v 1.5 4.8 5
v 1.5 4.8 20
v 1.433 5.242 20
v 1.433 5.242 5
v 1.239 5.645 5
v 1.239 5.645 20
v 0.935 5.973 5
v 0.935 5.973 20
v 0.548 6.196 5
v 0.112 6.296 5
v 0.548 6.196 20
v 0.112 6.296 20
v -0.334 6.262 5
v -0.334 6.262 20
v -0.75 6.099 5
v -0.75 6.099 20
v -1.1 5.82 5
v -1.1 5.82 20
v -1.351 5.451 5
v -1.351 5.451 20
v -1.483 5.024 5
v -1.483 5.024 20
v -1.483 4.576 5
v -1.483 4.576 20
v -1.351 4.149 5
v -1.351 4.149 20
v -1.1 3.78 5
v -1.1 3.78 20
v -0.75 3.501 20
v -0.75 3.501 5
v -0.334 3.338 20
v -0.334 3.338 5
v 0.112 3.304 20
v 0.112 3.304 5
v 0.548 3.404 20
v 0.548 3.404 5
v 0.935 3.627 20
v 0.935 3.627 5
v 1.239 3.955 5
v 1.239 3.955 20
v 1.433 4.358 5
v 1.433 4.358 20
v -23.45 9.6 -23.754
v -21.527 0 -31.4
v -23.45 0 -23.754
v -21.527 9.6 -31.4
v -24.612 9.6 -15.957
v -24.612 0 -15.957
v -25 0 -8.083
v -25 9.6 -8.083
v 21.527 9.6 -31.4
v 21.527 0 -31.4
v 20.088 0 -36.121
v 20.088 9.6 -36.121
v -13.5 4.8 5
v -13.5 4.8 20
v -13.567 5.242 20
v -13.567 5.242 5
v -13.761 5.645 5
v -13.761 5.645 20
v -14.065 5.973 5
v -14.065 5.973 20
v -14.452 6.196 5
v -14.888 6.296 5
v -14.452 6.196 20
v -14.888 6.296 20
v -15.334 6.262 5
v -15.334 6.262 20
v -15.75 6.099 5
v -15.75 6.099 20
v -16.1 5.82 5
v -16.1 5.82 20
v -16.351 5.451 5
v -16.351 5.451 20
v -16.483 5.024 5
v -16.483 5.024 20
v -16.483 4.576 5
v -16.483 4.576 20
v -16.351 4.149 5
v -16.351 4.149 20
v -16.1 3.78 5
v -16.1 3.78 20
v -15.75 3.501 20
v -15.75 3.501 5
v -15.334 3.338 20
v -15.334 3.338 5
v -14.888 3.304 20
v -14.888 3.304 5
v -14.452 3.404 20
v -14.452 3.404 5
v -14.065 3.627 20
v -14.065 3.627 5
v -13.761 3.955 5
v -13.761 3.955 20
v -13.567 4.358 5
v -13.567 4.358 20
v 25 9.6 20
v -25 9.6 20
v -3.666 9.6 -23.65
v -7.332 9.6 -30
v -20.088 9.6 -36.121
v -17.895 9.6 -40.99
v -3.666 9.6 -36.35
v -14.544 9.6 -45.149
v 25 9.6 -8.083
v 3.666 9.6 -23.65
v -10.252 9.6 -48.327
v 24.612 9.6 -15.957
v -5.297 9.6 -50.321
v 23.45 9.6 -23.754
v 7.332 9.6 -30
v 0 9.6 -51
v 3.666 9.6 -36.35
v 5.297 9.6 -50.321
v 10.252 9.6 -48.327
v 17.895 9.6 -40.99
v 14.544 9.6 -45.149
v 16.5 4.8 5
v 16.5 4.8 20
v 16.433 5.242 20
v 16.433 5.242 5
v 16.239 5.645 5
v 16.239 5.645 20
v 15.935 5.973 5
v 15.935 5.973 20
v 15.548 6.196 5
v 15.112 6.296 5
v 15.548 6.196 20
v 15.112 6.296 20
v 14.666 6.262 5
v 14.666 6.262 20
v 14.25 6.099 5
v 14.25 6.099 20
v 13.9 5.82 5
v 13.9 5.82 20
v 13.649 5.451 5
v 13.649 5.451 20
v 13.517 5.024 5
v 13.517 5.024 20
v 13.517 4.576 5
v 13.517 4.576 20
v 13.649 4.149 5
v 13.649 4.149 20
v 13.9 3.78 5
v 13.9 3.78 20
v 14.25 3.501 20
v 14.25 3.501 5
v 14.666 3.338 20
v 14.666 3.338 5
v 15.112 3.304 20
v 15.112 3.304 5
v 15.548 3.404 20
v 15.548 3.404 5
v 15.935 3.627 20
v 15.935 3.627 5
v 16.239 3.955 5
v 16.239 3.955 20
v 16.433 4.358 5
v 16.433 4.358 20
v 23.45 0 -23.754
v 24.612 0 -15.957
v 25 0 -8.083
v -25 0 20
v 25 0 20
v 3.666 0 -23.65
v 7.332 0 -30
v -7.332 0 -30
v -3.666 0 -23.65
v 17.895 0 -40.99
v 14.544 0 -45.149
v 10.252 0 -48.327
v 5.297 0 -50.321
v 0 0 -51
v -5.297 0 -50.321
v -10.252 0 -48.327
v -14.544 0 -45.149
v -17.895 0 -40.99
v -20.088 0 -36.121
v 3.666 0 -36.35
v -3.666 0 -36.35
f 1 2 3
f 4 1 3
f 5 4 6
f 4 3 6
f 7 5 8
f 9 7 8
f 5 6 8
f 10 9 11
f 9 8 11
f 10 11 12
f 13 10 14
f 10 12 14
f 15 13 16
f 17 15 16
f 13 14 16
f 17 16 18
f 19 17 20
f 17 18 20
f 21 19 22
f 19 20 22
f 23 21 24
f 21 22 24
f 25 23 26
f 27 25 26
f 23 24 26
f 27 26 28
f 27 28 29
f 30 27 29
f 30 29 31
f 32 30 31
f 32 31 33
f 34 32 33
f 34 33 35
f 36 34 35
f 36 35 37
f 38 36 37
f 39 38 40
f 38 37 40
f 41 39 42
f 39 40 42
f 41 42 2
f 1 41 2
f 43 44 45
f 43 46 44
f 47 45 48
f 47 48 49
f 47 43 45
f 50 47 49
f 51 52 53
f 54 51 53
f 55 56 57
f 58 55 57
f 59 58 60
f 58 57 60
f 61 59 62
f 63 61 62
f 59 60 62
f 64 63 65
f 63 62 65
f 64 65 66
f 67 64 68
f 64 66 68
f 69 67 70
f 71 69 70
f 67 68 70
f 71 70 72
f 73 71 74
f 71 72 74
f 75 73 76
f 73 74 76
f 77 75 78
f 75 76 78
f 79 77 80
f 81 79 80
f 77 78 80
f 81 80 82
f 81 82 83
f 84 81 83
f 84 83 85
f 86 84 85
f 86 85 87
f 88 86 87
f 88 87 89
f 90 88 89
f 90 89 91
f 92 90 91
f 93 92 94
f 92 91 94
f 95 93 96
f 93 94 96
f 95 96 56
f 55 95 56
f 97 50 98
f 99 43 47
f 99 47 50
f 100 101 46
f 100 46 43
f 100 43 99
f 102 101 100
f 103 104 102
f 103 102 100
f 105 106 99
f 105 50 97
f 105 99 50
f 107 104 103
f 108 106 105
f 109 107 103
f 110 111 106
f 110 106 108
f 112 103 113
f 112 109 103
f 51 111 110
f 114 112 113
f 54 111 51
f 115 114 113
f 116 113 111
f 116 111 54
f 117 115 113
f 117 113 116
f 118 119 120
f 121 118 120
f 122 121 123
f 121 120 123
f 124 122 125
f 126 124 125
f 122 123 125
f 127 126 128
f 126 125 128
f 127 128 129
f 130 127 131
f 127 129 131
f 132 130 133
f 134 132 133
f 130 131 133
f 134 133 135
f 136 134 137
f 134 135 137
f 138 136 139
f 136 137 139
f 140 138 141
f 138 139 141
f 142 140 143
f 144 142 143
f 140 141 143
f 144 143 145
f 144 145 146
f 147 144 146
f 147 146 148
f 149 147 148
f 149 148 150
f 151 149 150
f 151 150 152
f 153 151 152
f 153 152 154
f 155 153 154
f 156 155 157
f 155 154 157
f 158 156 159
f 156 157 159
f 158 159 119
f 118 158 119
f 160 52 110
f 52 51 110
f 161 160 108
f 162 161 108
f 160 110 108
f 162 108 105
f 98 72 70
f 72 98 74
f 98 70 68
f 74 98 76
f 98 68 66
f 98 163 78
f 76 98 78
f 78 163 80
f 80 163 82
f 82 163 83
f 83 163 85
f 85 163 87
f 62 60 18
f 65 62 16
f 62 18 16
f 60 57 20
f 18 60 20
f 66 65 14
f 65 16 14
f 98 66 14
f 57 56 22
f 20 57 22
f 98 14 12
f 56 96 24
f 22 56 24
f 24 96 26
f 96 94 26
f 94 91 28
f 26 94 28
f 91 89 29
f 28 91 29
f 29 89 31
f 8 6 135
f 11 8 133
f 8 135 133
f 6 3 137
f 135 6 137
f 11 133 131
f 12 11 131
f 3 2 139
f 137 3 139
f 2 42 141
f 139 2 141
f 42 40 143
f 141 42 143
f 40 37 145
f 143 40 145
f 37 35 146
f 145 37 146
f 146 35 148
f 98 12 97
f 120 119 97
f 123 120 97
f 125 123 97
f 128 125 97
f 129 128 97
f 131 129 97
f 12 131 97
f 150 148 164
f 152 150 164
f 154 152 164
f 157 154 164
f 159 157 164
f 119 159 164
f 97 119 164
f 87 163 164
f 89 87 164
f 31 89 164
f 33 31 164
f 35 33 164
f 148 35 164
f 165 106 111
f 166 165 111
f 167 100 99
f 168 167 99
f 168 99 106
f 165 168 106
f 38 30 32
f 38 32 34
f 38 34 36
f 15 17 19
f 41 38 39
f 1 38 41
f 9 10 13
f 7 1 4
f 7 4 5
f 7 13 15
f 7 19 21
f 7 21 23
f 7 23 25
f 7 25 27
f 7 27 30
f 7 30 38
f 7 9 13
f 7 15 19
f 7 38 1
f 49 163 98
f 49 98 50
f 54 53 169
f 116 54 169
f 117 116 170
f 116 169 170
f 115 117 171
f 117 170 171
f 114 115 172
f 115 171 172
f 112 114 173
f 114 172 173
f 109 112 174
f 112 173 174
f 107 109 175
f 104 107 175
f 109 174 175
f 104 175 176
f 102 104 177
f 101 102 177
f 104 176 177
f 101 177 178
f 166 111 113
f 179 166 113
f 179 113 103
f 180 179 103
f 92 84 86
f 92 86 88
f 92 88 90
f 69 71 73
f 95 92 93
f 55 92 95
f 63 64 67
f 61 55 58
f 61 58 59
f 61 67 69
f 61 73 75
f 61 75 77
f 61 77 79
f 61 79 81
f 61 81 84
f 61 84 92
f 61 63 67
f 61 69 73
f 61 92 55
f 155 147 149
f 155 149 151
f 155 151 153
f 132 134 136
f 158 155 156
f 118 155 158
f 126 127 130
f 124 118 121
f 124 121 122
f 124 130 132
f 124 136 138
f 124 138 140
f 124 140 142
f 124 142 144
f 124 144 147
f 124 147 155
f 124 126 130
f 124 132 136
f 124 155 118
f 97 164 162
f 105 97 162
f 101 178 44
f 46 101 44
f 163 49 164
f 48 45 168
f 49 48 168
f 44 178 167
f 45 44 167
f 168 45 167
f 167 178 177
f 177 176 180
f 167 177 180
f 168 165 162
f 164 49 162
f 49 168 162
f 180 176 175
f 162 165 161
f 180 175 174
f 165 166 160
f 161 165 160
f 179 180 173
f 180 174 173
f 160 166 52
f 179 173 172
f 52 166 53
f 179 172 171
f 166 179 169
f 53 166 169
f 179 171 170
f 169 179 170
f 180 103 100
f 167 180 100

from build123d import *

# Parameters (mm, degrees)
CROQUIS1_R              = 21
CROQUIS1_W              = 50
CROQUIS1_H              = 40
SALIENTE_EXTRUIR1_DEPTH = 9.6
CROQUIS2_R              = 16
CORTAR_EXTRUIR1_DEPTH   = 58.603472118
REDONDEO1_R             = 80
CROQUIS3_R              = 1.5
CORTAR_EXTRUIR2_DEPTH   = 15
MATRIZL1_COUNT          = 2
MATRIZL1_PITCH          = 15
MATRIZL1_COL_COUNT      = 2
MATRIZL1_COL_PITCH      = 15
SKETCH1_R               = 16
BOSS_EXTRUDE1_DEPTH     = 9.6
SKETCH3_R               = 10
BOSS_EXTRUDE2_DEPTH     = 9.6
CUT_EXTRUDE2_DEPTH      = 10


with BuildPart() as part:
    # Croquis1 → Saliente-Extruir1 (new body)
    with BuildSketch(Plane(origin=(0, 0, 0), x_dir=(1, 0, 0), z_dir=(0, 1, 0))):
        with Locations((0, 30)):
            Circle(CROQUIS1_R)
        Rectangle(CROQUIS1_W, CROQUIS1_H)
        with BuildLine():
            ThreePointArc((20.088252282, 36.120630706), (0, 51), (-20.088252282, 36.120630706))
            ThreePointArc((-20.088252282, 36.120630706), (-20.89449325, 27.897584284), (-18.466185313, 20))
            Line((-18.466185313, 20), (18.466185313, 20))
            ThreePointArc((18.466185313, 20), (20.356692899, 24.841991255), (21, 30))
            ThreePointArc((21, 30), (20.770812429, 33.09408323), (20.088252282, 36.120630706))
        make_face()
        with BuildLine():
            Line((18.466185313, 20), (-18.466185313, 20))
            ThreePointArc((-18.466185313, 20), (0, 9), (18.466185313, 20))
        make_face()
        with BuildLine():
            Line((25, 20), (20.088252282, 36.120630706))
            ThreePointArc((20.088252282, 36.120630706), (20.770812429, 33.09408323), (21, 30))
            ThreePointArc((21, 30), (20.356692899, 24.841991255), (18.466185313, 20))
            Line((18.466185313, 20), (25, 20))
        make_face()
        with BuildLine():
            Line((-20.088252282, 36.120630706), (-25, 20))
            Line((-25, 20), (-18.466185313, 20))
            ThreePointArc((-18.466185313, 20), (-20.89449325, 27.897584284), (-20.088252282, 36.120630706))
        make_face()
    extrude(amount=SALIENTE_EXTRUIR1_DEPTH)

    # Croquis2 → Cortar-Extruir1 (cut, through all)
    with BuildSketch(Plane(origin=(0, 9.6, 0), x_dir=(1, 0, 0), z_dir=(0, 1, 0))):
        with Locations(Location((0, 30, 0), (0, 0, 270))):
            Circle(CROQUIS2_R)
    extrude(amount=-CORTAR_EXTRUIR1_DEPTH, mode=Mode.SUBTRACT)

    # Redondeo1
    redondeo1_edges = [part.edges().sort_by_distance(p)[0] for p in [
        (25, 4.8, -20),
        (-25, 4.8, -20),
    ]]
    fillet(redondeo1_edges, radius=REDONDEO1_R)

    # Croquis3 → Cortar-Extruir2 (cut)
    with BuildSketch(Plane.XY.offset(20)):
        with Locations((0, 4.8)):
            Circle(CROQUIS3_R)
    cortar_extruir2 = extrude(amount=-CORTAR_EXTRUIR2_DEPTH, mode=Mode.SUBTRACT)

    # MatrizL1: Cortar-Extruir2 ×2
    with Locations(*[(i * MATRIZL1_PITCH, 0, 0) for i in range(1, MATRIZL1_COUNT)]):
        add(cortar_extruir2, mode=Mode.SUBTRACT)

    # MatrizL1 col: Cortar-Extruir2 ×2
    with Locations(*[(-i * MATRIZL1_COL_PITCH, 0, 0) for i in range(1, MATRIZL1_COL_COUNT)]):
        add(cortar_extruir2, mode=Mode.SUBTRACT)

    # Sketch1 → Boss-Extrude1 (add)
    with BuildSketch(Plane(origin=(0, 9.6, 0), x_dir=(1, 0, 0), z_dir=(0, 1, 0))):
        with Locations((0, 30)):
            Circle(SKETCH1_R)
        with BuildLine():
            Line((-2.5, 36.538348415), (-2.5, 39.5))
            Line((-2.5, 39.5), (2.5, 39.5))
            Line((2.5, 39.5), (2.5, 36.538348415))
            ThreePointArc((2.5, 36.538348415), (5.766281297, 33.968626967), (7, 30))
            ThreePointArc((7, 30), (-3.968626967, 24.233718703), (-2.5, 36.538348415))
        make_face(mode=Mode.SUBTRACT)
    extrude(amount=-BOSS_EXTRUDE1_DEPTH)

    # Sketch3 → Boss-Extrude2 (add)
    with BuildSketch(Plane(origin=(0, 9.6, 0), x_dir=(1, 0, 0), z_dir=(0, 1, 0))):
        with Locations((0, 30)):
            Circle(SKETCH3_R)
    extrude(amount=-BOSS_EXTRUDE2_DEPTH)

    # Sketch2 → Cut-Extrude2 (cut)
    with BuildSketch(Plane(origin=(0, 9.6, 0), x_dir=(1, 0, 0), z_dir=(0, 1, 0))):
        Polygon((3.666174209, 36.35), (-3.666174209, 36.35), (-7.332348419, 30), (-3.666174209, 23.65), (3.666174209, 23.65), (7.332348419, 30), align=None)
    extrude(amount=-CUT_EXTRUDE2_DEPTH, mode=Mode.SUBTRACT)


solid = part.part
